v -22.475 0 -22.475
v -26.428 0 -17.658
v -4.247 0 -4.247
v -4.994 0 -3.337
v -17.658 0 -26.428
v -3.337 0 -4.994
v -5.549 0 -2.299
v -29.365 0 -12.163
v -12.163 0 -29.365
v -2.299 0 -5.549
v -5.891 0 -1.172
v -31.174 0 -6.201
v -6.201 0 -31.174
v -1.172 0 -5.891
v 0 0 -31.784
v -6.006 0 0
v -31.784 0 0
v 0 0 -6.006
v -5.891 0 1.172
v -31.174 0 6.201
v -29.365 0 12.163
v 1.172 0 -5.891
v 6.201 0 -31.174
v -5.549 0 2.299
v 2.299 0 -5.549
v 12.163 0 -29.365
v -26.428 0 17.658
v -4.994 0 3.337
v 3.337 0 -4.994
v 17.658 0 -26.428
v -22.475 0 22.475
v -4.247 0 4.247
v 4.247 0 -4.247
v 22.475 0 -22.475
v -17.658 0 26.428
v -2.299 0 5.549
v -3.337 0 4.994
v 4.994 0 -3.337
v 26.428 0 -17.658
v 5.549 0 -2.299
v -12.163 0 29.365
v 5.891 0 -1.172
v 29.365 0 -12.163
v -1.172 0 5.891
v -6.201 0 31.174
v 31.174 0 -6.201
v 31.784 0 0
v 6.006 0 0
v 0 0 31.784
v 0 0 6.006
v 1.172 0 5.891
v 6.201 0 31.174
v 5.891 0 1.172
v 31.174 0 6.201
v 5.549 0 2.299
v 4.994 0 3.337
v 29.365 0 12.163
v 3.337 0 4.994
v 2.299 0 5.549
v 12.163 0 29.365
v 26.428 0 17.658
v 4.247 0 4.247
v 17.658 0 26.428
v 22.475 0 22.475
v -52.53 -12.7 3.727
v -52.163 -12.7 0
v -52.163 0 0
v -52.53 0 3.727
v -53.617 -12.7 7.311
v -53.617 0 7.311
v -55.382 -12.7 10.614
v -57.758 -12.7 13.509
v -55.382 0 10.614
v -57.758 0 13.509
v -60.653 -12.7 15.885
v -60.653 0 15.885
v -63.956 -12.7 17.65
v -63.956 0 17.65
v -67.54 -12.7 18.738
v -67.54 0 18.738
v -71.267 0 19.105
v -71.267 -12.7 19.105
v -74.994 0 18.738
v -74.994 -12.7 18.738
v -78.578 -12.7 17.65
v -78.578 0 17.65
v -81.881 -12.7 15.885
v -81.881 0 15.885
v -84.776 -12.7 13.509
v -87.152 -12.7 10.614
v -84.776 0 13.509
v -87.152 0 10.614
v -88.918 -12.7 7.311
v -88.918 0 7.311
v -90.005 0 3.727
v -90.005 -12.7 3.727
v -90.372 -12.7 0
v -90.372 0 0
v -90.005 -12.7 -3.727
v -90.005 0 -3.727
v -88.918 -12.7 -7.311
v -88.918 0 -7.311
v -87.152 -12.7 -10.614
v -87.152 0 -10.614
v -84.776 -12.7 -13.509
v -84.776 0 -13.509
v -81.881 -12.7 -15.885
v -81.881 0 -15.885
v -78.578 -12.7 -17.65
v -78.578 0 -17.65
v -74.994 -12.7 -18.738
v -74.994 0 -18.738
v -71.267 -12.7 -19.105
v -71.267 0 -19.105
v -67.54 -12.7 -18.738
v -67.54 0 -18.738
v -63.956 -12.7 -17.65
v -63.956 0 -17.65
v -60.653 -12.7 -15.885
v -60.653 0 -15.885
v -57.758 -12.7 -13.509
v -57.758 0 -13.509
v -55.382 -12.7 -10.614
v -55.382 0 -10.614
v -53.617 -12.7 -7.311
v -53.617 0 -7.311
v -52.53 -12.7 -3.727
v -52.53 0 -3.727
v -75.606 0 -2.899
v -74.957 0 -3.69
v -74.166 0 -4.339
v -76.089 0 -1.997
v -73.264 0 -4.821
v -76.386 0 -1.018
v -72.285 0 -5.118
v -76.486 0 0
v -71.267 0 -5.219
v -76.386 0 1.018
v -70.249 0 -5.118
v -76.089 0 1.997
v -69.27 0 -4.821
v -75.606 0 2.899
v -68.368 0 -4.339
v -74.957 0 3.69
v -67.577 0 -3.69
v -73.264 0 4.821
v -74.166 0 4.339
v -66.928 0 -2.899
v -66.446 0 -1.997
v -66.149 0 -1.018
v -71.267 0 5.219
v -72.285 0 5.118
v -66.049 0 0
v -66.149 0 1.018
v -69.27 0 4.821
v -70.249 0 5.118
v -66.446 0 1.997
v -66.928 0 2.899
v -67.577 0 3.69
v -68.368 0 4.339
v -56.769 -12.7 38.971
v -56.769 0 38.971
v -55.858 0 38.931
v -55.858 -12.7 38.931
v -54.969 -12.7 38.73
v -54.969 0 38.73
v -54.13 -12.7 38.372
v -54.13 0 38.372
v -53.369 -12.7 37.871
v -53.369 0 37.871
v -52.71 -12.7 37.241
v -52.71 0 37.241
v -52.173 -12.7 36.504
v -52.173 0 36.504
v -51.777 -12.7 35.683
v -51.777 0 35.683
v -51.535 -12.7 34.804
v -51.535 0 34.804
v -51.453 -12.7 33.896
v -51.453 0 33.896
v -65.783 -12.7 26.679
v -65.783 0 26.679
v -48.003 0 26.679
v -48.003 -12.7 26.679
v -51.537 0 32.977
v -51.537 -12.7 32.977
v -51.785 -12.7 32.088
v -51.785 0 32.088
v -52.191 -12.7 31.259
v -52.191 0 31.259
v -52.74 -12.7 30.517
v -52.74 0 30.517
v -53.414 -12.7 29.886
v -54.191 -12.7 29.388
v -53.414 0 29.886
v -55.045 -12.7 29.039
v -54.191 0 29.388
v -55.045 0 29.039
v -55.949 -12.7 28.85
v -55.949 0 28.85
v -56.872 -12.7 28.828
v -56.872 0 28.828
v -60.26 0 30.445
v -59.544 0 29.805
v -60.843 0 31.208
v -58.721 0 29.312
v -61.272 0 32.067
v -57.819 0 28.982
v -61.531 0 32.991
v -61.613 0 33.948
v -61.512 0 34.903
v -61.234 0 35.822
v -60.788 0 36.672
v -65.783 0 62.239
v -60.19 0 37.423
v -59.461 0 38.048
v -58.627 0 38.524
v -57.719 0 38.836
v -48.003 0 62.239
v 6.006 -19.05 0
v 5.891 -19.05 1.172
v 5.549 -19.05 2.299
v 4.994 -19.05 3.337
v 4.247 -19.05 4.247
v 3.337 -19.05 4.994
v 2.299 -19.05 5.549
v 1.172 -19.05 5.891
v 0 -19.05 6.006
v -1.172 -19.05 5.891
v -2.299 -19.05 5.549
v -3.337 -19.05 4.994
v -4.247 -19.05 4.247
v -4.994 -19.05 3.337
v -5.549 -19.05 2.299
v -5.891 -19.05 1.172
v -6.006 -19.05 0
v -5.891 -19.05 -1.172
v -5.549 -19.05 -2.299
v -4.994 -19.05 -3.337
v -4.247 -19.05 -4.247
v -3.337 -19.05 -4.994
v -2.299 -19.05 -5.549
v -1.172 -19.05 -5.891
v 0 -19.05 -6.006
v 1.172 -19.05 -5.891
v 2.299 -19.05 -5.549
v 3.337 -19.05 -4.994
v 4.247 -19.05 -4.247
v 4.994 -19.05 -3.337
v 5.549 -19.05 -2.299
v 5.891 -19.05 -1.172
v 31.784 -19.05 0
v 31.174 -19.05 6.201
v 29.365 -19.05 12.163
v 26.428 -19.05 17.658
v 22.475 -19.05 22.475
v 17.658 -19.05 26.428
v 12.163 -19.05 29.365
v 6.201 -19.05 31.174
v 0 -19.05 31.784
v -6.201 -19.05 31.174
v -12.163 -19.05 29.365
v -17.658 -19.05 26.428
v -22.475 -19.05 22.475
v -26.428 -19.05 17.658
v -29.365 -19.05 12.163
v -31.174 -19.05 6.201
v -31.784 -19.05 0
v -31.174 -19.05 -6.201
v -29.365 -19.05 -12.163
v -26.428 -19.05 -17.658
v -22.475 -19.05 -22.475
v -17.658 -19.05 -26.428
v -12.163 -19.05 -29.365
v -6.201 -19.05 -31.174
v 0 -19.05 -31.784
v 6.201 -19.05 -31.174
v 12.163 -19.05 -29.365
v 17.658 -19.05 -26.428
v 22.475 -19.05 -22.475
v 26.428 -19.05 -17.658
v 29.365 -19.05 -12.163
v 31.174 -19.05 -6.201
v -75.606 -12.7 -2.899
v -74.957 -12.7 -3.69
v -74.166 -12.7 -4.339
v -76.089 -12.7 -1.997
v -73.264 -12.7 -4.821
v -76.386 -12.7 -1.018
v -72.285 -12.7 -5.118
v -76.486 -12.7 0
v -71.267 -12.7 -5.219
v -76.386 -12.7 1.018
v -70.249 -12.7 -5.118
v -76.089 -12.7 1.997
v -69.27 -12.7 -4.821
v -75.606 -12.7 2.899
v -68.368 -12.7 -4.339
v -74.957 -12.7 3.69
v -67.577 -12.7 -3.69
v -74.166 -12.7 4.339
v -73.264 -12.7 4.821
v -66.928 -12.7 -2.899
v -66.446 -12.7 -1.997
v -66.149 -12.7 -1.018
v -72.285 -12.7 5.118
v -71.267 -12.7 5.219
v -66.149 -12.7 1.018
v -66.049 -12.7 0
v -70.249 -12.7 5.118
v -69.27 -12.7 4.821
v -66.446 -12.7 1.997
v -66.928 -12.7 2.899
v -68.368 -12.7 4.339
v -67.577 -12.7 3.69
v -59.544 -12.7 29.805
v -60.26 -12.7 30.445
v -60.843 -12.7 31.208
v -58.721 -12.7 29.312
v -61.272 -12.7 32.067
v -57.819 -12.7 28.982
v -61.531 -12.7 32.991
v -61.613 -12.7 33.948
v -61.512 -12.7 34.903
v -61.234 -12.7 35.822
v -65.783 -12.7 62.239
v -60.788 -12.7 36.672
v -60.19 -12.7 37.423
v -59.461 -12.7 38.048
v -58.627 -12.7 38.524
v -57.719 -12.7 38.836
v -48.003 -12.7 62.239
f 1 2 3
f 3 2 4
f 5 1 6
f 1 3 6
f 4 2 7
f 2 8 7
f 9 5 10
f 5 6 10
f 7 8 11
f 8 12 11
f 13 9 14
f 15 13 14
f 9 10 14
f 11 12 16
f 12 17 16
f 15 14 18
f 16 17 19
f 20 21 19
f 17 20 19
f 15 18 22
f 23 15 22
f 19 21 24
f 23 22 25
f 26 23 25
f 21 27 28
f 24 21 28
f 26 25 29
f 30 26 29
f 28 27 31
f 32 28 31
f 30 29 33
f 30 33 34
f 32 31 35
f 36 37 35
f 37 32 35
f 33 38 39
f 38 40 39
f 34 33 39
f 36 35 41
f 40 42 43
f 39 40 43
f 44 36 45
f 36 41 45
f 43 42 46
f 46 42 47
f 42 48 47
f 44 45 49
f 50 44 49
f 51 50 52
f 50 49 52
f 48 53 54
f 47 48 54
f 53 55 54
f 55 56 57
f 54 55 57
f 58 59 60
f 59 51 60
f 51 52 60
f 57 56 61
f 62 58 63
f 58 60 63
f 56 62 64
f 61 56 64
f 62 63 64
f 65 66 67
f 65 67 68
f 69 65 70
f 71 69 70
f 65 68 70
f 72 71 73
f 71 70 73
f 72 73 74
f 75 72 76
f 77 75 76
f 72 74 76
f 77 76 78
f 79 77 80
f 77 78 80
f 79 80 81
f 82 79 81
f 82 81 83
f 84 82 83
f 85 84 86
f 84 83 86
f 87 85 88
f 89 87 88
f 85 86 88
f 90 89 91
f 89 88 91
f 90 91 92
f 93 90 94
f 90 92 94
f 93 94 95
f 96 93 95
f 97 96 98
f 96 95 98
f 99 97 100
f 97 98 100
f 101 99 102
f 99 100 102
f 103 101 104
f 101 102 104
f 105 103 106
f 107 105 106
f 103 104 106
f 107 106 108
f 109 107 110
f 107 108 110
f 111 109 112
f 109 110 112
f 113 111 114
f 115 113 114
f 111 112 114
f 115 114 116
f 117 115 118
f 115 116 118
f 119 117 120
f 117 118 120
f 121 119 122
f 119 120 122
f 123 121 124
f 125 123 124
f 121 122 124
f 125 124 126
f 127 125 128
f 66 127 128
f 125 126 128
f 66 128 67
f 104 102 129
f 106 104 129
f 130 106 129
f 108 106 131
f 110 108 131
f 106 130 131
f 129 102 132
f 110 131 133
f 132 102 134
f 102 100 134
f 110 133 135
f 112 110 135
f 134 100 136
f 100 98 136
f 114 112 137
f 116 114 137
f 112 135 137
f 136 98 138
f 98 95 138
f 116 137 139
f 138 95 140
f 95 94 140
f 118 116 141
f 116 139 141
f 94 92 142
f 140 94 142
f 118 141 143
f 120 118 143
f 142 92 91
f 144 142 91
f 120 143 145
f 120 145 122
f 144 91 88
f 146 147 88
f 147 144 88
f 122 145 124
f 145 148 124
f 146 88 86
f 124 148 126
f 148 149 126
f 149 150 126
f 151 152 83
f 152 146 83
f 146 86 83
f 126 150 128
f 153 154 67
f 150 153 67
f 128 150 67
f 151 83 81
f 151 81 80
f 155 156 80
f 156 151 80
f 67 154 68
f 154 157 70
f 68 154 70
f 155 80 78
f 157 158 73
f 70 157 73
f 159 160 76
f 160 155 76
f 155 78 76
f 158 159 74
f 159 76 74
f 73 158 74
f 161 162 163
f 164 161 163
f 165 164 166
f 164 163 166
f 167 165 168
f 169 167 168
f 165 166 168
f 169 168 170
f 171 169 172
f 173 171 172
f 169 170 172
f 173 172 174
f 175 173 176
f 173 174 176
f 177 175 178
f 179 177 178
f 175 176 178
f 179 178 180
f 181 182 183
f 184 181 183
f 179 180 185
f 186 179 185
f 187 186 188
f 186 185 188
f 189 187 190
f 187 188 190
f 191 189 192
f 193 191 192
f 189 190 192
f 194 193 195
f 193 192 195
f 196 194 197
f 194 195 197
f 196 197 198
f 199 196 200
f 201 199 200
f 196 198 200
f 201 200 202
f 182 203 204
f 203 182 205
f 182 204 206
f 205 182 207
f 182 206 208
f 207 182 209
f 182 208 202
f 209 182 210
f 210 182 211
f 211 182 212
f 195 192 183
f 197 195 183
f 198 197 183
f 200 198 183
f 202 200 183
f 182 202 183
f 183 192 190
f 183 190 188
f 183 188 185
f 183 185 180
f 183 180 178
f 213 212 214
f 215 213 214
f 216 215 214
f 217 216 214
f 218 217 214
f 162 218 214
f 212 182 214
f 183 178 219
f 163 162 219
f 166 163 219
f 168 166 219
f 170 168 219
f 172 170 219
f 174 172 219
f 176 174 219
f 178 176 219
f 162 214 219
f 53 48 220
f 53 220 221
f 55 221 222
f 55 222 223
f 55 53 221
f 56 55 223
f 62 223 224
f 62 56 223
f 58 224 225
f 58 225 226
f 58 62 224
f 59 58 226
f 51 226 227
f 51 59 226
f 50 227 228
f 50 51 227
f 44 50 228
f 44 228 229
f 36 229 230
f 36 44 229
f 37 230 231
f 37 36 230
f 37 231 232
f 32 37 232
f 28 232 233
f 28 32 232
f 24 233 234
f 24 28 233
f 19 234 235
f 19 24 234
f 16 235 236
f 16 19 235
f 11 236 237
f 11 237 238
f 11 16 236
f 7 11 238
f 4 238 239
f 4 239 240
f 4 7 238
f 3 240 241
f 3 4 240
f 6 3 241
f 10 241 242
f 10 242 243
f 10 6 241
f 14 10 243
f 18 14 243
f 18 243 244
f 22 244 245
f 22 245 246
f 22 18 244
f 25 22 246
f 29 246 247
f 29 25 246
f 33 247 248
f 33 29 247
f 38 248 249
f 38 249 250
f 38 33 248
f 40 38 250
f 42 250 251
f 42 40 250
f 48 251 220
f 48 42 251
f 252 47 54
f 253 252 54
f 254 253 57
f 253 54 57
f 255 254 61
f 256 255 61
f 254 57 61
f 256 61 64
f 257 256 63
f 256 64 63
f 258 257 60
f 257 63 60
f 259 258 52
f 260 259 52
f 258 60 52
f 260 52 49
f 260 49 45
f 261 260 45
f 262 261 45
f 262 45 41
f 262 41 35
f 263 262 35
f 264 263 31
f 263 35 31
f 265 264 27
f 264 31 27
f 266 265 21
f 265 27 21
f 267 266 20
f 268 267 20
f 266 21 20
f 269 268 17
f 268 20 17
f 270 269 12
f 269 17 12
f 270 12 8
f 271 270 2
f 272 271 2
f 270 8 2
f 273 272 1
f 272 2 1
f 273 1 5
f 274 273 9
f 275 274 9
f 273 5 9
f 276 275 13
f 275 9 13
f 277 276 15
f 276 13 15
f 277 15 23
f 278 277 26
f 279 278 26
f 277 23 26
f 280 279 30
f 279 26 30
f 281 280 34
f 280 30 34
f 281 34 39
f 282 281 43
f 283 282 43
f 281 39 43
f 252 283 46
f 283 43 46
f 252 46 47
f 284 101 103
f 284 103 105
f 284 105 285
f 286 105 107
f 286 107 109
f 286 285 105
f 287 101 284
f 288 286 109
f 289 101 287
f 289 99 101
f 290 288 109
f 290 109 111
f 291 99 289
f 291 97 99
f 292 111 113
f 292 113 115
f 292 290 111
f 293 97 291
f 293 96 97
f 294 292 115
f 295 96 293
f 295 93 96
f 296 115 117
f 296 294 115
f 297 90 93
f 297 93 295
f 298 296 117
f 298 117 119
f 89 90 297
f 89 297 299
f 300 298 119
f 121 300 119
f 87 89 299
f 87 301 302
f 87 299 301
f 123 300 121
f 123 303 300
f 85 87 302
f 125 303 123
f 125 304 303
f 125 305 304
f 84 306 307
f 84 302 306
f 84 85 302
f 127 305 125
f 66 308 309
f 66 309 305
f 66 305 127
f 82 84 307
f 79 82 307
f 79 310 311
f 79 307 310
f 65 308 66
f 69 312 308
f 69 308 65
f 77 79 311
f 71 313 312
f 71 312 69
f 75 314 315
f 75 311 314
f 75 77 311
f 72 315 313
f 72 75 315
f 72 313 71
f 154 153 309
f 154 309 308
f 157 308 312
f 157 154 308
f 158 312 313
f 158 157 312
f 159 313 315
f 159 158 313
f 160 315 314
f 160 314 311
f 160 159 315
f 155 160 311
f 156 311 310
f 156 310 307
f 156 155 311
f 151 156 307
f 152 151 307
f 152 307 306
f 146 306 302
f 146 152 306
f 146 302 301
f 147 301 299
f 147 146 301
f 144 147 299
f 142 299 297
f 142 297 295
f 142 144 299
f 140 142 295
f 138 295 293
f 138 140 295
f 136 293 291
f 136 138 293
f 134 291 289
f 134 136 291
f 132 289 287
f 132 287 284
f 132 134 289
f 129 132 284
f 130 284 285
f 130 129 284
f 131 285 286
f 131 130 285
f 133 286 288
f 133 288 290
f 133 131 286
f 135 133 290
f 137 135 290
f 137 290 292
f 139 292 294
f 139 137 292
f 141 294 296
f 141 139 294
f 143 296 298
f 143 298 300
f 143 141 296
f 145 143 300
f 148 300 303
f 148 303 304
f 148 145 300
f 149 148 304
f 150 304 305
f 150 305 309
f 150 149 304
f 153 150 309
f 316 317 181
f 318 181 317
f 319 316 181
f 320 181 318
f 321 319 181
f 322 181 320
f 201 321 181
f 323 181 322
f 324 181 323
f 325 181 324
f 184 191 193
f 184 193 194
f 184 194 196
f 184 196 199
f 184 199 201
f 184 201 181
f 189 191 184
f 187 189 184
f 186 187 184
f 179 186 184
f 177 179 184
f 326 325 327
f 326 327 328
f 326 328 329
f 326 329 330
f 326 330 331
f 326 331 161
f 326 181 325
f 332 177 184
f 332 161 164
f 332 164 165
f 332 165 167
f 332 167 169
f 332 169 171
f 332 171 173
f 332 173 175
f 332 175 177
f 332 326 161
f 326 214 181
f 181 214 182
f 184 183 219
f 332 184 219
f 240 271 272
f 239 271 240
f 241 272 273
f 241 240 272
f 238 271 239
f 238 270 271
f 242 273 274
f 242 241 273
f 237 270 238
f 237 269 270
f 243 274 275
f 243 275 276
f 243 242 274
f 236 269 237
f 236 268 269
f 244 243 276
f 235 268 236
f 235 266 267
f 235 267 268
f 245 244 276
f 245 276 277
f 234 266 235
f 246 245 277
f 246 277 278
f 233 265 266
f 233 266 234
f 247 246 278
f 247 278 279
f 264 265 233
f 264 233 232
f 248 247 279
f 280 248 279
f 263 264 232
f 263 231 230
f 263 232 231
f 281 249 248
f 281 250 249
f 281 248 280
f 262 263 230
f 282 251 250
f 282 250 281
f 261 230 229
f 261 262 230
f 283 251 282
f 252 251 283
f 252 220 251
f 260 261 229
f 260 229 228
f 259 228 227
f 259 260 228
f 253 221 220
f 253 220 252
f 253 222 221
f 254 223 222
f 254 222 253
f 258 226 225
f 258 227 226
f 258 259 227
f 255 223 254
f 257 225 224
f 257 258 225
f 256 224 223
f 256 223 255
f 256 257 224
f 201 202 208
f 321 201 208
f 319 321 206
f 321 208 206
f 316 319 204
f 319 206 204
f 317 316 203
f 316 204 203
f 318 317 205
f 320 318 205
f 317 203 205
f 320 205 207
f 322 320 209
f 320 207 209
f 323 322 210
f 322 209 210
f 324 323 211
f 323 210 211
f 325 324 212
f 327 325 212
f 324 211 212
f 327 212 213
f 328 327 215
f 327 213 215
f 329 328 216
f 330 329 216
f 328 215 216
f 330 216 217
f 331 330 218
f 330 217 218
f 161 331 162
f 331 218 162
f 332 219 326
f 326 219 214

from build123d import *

# Parameters (mm, degrees)
F0_R     = 31.784326
F0_R_2   = 6.006463
F1_DEPTH = 19.05
F2_R     = 19.104648
F2_R_2   = 5.218593
F3_DEPTH = 12.7
F5_DEPTH = 12.7


with BuildPart() as f1:
    # F0 (on Front) → F1 (new body)
    with BuildSketch(Plane.XZ):
        Circle(F0_R)
        Circle(F0_R_2, mode=Mode.SUBTRACT)
    extrude(amount=F1_DEPTH)


with BuildPart() as f3:
    # F2 (on Front) → F3 (new body)
    with BuildSketch(Plane.XZ):
        with Locations((-71.267188, 0)):
            Circle(F2_R)
        with Locations((-71.267188, 0)):
            Circle(F2_R_2, mode=Mode.SUBTRACT)
    extrude(amount=F3_DEPTH)


with BuildPart() as f5:
    # F4 (on Front) → F5 (new body)
    with BuildSketch(Plane.XZ):
        with BuildLine():
            Line((-56.532775, 62.239115), (-65.783464, 62.239115))
            Line((-65.783464, 62.239115), (-65.783464, 26.679115))
            Line((-65.783464, 26.679115), (-56.893464, 26.679115))
            Line((-56.893464, 26.679115), (-56.871671, 28.827722))
            ThreePointArc((-56.871671, 28.827722), (-61.612514, 33.94793), (-56.768787, 38.97092))
            Line((-56.768787, 38.97092), (-56.532775, 62.239115))
        make_face()
        with BuildLine():
            Line((-48.003464, 62.239115), (-56.532775, 62.239115))
            Line((-56.532775, 62.239115), (-56.768787, 38.97092))
            ThreePointArc((-56.768787, 38.97092), (-53.025108, 37.571003), (-51.452775, 33.896405))
            ThreePointArc((-51.452775, 33.896405), (-53.062558, 30.186419), (-56.871671, 28.827722))
            Line((-56.871671, 28.827722), (-56.893464, 26.679115))
            Line((-56.893464, 26.679115), (-48.003464, 26.679115))
            Line((-48.003464, 26.679115), (-48.003464, 62.239115))
        make_face()
    extrude(amount=F5_DEPTH)


solid = Compound([f1.part, f3.part, f5.part])
